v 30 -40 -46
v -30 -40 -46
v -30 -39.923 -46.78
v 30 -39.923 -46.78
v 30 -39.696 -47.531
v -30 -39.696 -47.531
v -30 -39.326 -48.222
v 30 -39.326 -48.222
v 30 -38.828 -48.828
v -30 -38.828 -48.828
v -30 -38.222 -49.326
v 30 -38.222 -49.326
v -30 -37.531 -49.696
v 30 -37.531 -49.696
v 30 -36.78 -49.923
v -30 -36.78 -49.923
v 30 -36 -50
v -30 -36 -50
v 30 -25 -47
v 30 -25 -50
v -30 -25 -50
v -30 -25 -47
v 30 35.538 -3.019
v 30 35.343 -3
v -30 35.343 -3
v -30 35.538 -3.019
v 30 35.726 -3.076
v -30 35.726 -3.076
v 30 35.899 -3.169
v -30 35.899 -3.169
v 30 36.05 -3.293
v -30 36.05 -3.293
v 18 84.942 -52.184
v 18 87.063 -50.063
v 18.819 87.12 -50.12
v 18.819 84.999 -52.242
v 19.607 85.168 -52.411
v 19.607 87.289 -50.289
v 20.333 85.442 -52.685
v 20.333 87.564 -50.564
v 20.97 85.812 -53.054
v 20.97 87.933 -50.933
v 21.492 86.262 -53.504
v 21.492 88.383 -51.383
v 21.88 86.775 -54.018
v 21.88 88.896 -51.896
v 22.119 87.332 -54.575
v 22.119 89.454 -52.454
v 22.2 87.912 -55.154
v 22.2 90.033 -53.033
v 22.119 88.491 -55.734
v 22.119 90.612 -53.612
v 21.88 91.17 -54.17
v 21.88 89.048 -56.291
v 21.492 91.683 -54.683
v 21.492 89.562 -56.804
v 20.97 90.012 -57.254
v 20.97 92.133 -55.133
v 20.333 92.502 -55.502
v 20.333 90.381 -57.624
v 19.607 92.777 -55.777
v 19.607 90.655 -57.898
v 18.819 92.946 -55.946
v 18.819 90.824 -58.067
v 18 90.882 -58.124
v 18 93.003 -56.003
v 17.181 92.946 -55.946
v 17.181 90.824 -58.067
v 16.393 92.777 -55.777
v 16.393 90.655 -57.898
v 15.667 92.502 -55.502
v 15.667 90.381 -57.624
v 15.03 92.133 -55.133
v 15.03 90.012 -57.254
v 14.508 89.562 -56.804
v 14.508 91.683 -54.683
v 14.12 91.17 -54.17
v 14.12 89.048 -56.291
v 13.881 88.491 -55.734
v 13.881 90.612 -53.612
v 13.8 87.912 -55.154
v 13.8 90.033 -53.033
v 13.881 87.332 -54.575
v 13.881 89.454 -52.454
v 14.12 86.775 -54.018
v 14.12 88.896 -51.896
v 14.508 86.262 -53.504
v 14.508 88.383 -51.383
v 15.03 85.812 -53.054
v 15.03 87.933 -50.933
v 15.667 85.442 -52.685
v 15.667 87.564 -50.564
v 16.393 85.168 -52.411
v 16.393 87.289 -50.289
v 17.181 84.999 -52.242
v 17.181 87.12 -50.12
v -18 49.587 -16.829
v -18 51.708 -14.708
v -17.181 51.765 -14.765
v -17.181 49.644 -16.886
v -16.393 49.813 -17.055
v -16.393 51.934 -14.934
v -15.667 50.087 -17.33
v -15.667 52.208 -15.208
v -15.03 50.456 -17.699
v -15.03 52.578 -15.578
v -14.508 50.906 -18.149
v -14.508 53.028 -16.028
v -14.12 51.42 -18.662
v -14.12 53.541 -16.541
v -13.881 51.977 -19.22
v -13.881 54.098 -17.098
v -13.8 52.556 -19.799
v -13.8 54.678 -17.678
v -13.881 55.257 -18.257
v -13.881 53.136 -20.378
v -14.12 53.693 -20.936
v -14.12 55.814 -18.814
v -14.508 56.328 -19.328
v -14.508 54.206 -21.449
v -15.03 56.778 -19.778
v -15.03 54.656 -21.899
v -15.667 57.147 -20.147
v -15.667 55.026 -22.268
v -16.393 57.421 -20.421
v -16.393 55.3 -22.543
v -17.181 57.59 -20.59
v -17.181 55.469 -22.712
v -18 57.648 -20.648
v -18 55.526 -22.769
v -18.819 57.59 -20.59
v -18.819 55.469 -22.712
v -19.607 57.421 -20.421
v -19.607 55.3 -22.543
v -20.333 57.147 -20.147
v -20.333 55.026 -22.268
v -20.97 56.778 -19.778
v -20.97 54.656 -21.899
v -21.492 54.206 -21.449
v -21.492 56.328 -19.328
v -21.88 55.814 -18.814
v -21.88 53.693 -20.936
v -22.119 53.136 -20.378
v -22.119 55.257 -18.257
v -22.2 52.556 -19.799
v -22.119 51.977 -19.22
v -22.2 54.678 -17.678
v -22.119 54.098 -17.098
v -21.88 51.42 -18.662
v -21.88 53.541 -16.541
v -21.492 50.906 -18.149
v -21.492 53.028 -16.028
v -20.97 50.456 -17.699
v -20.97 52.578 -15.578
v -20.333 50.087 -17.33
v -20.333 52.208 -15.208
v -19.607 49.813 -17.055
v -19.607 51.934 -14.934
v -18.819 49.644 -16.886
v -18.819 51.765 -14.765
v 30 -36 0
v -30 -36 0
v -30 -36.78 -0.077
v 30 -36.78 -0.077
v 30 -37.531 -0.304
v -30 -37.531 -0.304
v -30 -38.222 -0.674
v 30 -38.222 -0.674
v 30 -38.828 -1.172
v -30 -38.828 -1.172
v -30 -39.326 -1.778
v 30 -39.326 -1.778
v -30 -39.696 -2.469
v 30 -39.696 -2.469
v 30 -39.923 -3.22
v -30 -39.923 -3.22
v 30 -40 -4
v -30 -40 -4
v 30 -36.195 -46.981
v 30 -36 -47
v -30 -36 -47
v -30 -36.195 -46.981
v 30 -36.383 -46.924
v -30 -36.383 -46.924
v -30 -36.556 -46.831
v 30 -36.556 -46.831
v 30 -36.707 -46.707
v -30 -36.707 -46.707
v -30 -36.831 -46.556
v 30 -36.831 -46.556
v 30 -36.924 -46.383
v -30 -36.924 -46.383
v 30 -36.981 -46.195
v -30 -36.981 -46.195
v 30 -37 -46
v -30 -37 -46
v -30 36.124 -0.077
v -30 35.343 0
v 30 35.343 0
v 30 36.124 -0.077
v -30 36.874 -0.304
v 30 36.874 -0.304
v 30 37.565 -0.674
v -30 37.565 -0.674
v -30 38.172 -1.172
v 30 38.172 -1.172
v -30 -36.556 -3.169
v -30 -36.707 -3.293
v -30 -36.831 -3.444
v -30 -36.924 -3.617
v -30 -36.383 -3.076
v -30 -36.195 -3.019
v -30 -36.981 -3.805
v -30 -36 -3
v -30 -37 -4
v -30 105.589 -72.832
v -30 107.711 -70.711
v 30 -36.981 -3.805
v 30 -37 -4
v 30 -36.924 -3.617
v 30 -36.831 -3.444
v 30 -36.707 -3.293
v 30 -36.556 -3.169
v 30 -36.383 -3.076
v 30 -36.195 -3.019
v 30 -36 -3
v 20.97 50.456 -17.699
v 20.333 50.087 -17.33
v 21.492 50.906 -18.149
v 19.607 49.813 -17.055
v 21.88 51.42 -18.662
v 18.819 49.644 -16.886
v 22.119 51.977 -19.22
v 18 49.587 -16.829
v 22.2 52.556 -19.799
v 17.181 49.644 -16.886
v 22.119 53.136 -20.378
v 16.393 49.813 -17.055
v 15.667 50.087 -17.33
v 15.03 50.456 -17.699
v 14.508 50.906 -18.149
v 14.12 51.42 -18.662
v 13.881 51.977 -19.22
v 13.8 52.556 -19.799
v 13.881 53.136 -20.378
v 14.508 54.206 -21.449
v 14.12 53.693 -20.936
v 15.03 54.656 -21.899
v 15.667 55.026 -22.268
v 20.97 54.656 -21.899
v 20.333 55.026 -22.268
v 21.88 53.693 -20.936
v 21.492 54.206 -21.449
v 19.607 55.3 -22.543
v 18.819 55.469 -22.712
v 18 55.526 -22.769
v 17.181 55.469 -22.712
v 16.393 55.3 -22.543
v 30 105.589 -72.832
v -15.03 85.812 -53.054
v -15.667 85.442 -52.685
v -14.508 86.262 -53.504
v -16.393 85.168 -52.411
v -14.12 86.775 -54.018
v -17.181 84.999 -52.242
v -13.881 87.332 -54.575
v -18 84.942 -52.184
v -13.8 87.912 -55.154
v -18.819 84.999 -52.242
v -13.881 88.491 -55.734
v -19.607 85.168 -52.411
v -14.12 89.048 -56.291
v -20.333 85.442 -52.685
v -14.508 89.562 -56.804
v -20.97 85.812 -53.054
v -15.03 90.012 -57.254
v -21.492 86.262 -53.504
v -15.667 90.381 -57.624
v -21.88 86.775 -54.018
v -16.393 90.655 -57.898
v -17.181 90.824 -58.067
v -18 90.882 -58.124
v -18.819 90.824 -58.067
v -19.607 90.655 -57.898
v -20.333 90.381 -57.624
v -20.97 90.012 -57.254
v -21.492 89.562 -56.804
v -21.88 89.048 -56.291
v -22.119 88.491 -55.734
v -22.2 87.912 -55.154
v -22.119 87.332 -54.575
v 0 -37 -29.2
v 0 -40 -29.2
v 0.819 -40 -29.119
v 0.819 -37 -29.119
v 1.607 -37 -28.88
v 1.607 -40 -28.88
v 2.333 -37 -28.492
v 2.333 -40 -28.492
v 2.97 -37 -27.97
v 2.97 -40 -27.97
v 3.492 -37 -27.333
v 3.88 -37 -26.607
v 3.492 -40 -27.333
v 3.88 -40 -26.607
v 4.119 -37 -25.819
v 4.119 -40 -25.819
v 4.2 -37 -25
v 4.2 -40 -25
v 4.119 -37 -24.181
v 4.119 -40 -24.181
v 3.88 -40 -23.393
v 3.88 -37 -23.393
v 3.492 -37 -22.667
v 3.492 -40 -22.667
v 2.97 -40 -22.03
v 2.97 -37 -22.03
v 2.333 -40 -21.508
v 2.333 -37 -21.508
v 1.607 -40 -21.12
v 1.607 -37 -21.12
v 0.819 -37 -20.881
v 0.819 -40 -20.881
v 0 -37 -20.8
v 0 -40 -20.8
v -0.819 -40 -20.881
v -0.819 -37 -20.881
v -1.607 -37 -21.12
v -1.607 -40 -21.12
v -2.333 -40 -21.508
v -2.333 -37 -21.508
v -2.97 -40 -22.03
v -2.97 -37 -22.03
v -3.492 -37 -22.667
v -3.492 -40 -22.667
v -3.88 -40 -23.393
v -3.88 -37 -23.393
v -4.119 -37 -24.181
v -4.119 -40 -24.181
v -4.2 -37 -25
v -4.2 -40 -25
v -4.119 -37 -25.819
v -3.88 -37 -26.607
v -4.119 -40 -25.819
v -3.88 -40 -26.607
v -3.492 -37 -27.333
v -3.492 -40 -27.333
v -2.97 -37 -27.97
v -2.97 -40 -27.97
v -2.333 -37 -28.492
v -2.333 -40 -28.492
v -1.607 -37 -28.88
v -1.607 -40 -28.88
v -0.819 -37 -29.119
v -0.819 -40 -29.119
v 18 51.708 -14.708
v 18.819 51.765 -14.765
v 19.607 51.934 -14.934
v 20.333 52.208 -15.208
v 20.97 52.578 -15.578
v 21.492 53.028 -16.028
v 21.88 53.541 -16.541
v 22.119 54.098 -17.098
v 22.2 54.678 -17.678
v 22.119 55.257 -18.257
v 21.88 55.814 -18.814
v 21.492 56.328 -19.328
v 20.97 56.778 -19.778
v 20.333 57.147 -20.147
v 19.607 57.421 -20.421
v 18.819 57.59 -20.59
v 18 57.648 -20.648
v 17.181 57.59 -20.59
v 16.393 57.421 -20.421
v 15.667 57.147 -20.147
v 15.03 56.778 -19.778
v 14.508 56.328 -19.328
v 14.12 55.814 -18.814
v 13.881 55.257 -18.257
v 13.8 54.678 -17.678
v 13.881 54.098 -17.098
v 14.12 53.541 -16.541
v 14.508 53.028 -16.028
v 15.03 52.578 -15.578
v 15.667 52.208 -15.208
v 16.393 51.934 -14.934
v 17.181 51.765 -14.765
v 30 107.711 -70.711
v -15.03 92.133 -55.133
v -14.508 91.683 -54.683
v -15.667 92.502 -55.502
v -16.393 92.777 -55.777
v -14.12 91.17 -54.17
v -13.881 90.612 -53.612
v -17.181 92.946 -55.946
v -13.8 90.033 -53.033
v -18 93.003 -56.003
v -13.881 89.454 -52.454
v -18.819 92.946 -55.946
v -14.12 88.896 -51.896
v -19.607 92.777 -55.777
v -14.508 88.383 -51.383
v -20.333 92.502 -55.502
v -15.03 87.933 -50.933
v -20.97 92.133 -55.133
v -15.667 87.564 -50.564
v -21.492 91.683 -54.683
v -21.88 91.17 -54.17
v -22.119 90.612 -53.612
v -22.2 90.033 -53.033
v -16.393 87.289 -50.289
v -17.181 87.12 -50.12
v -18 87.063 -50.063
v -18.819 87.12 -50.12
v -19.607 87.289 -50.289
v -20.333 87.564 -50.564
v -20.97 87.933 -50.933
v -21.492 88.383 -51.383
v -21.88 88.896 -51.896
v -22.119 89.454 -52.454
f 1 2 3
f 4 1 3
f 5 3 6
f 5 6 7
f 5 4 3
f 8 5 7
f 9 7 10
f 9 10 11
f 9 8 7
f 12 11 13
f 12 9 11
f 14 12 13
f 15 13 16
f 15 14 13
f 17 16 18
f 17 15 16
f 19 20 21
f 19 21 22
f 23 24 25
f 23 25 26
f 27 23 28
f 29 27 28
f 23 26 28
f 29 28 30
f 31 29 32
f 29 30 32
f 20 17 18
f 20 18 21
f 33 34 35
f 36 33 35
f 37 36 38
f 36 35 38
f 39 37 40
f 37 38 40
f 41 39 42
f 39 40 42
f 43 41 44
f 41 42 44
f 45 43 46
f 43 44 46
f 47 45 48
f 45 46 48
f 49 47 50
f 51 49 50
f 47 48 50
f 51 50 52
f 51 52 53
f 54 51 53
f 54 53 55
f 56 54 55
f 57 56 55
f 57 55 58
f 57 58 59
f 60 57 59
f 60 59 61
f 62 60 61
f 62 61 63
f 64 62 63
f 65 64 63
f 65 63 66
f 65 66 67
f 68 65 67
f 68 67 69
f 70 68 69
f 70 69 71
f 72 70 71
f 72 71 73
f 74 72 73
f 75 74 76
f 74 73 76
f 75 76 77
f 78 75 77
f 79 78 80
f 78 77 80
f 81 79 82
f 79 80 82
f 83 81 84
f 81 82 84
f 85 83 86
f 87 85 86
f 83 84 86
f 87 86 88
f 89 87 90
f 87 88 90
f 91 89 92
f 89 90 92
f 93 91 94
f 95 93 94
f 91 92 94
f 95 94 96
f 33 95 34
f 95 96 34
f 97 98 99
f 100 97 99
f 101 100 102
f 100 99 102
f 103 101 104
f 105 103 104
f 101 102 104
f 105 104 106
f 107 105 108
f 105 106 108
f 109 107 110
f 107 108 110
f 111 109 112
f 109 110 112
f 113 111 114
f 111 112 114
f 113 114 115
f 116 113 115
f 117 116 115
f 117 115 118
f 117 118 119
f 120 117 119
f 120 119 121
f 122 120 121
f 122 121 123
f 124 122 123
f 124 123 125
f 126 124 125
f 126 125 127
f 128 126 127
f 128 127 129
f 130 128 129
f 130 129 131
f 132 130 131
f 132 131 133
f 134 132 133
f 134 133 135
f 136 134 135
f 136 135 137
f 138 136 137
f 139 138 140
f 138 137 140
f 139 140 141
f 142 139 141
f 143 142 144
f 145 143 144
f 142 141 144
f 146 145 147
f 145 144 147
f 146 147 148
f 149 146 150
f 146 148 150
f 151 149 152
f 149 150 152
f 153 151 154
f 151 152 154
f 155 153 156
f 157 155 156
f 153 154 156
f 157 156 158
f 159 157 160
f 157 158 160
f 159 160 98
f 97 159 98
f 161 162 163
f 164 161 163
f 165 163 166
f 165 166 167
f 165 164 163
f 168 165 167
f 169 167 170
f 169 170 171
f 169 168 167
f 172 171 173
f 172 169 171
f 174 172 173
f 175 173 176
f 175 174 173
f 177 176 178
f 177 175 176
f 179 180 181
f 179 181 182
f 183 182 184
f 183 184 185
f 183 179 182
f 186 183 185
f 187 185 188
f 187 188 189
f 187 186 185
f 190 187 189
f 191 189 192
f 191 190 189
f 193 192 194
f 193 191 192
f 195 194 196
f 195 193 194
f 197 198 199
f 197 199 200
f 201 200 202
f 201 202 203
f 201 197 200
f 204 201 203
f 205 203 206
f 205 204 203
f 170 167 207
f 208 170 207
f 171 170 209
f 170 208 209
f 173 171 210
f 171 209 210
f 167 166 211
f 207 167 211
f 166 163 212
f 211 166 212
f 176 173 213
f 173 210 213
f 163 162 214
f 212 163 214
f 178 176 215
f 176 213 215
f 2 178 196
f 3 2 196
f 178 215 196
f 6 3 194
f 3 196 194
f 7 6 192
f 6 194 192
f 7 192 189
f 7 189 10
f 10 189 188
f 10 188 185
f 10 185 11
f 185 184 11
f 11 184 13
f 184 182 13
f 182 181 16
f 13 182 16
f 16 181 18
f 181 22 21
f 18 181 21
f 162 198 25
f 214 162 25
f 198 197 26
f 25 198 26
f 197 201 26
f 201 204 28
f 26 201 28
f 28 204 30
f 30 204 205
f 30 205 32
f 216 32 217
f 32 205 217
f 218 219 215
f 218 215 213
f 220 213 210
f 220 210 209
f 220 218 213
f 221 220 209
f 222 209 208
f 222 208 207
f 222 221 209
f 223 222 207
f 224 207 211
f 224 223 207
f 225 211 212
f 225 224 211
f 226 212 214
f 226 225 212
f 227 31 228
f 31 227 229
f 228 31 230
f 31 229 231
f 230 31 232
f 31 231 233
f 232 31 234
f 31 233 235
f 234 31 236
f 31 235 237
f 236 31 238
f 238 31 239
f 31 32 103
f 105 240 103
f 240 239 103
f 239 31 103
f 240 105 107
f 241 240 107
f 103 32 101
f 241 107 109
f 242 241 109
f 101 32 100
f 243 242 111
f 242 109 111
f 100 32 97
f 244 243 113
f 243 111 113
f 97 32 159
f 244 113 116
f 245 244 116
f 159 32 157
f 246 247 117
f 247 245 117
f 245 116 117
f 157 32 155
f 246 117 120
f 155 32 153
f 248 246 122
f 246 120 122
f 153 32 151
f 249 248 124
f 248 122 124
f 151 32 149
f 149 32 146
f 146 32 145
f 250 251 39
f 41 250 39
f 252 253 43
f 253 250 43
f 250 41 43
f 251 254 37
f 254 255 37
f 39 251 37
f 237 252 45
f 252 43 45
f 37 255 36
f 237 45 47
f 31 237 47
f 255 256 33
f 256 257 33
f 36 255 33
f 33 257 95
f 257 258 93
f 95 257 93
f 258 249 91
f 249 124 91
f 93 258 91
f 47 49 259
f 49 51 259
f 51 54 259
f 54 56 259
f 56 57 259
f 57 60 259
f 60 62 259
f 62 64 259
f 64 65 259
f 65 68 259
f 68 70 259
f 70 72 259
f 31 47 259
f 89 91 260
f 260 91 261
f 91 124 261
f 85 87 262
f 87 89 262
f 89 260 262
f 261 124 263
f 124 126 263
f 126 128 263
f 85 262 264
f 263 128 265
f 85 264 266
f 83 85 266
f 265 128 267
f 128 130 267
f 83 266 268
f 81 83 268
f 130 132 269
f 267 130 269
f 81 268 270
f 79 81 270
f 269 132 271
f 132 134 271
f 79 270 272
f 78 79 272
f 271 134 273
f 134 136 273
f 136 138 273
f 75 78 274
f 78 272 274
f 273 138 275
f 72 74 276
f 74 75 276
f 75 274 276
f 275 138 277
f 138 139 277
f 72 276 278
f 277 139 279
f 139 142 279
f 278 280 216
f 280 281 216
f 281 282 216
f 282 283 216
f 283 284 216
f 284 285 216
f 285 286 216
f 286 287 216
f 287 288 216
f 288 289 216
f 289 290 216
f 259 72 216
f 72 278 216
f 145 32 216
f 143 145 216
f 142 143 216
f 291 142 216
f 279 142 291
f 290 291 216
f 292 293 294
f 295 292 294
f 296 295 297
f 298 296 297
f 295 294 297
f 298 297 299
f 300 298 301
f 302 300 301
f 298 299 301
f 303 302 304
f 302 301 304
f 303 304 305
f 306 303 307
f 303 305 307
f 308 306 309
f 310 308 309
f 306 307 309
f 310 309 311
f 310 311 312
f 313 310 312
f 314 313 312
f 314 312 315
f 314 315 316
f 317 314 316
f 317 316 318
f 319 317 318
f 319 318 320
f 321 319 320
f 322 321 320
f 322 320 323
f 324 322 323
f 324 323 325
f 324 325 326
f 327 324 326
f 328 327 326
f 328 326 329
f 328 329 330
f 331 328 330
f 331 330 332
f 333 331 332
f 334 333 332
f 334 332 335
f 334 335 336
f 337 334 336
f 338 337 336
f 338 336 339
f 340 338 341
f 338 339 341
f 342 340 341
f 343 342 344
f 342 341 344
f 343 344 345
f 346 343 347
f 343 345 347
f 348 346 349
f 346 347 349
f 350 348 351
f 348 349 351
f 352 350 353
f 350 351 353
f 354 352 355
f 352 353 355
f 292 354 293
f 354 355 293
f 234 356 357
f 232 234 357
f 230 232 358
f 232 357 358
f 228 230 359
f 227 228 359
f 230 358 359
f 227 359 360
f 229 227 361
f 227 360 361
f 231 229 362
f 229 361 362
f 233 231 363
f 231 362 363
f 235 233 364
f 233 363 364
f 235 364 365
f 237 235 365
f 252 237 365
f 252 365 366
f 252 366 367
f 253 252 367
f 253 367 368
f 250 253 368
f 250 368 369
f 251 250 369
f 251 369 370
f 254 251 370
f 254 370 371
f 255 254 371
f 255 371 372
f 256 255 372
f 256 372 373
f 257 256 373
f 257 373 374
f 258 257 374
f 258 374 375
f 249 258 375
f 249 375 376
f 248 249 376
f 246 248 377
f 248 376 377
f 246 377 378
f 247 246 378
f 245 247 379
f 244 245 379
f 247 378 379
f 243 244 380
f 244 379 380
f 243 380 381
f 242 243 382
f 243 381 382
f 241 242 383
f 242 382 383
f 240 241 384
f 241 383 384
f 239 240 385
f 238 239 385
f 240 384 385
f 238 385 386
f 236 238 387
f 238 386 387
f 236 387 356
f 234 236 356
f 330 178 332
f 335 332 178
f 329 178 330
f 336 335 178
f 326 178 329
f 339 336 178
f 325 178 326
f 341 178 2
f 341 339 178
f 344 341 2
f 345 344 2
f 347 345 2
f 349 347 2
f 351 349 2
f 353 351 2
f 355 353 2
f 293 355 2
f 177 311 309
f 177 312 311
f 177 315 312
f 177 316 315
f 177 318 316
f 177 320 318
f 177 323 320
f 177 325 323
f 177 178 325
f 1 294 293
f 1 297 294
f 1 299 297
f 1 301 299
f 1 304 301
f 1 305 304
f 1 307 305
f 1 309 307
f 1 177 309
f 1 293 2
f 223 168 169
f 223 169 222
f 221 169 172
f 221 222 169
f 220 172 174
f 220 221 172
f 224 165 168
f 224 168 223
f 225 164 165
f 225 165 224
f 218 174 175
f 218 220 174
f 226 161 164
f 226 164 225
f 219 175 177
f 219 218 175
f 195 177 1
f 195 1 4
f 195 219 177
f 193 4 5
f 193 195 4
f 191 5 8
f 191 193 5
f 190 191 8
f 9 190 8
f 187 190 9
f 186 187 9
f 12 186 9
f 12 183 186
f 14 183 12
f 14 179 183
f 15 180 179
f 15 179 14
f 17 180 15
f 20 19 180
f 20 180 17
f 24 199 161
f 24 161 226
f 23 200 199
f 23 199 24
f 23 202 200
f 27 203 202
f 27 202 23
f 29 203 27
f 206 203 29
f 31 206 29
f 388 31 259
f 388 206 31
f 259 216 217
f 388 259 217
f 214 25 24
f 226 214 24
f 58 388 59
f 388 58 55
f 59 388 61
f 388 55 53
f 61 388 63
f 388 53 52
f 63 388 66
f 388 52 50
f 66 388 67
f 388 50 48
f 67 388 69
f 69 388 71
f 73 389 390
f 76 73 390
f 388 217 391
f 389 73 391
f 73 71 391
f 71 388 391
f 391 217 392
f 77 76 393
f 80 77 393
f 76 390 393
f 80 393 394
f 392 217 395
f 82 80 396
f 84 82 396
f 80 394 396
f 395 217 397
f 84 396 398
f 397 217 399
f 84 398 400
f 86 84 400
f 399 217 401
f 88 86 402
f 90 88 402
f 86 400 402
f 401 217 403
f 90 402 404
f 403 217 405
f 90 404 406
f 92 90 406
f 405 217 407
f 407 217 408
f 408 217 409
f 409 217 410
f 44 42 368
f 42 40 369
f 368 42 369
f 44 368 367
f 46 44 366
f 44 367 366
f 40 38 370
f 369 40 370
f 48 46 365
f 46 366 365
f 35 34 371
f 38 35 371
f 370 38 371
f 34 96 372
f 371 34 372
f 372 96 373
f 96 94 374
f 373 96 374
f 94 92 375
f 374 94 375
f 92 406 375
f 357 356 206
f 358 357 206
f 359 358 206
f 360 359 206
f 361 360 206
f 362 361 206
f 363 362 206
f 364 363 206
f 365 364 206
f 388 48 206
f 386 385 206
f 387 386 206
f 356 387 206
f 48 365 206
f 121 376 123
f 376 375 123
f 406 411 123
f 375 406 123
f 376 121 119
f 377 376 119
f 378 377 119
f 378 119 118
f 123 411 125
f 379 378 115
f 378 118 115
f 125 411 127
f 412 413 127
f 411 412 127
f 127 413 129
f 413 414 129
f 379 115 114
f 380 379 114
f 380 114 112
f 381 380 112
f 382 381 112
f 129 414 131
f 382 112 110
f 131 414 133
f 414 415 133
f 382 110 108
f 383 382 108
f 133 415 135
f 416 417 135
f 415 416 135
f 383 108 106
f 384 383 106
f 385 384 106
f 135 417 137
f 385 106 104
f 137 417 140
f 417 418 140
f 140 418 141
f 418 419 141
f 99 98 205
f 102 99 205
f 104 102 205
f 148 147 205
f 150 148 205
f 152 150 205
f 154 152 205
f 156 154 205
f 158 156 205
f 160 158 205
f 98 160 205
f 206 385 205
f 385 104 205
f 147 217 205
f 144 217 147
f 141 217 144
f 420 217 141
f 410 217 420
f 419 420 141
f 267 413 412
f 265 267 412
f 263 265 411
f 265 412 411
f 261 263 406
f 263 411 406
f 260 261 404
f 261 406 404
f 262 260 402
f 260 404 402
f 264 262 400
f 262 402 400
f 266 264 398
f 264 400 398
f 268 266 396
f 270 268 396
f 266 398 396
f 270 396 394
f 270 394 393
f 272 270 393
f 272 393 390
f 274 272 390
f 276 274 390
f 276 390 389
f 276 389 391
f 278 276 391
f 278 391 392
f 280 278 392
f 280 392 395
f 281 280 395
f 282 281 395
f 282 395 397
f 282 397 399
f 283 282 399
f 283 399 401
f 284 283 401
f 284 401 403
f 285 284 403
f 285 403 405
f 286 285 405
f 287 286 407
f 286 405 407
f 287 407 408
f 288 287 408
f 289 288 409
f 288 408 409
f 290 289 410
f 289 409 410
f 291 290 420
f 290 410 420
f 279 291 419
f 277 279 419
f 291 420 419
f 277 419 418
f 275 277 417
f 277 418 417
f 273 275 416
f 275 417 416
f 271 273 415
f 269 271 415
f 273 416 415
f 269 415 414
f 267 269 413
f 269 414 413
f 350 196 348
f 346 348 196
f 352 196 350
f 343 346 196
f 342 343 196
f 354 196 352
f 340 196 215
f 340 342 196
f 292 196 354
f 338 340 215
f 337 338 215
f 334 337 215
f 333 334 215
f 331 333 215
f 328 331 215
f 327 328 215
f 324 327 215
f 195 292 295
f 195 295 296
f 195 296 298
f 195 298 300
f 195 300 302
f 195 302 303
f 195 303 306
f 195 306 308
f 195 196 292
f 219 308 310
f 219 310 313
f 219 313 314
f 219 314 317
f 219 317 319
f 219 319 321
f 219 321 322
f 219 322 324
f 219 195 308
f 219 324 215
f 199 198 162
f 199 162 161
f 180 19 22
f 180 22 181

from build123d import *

# Parameters (mm, degrees)
SKETCH1_W                    = 60
SKETCH1_H                    = 80
BASE_FLANGE1_DEPTH           = 3
EDGE_FLANGE1_START           = -30
EDGE_FLANGE1_DEPTH           = 60
EDGE_FLANGE1_2_DEPTH         = 60
EDGE_FLANGE2_STRIP_W         = 14
EDGE_FLANGE2_STRIP_H         = 3
EDGE_FLANGE2_STRIP_CUT_DEPTH = 60
EDGE_FLANGE2_DEPTH           = 60
EDGE_FLANGE3_STRIP_W         = 14
EDGE_FLANGE3_STRIP_H         = 3
EDGE_FLANGE3_STRIP_CUT_DEPTH = 60
EDGE_FLANGE3_DEPTH           = 60
SKETCH17_R                   = 4.2
CUT_EXTRUDE1_DEPTH           = 10
SKETCH18_R                   = 4.2
CUT_EXTRUDE2_DEPTH           = 10


# Read off the part's stored shape, not the designer's step: Edge-Flange1
# Sheet-metal steps are written as plain solids
with BuildPart() as part:
    # Sketch1 → Base-Flange1 (new body)
    with BuildSketch(Plane.XY):
        Rectangle(SKETCH1_W, SKETCH1_H)
    extrude(amount=-BASE_FLANGE1_DEPTH)

    # Edge-Flange1 outline → Edge-Flange1 (cut)
    with BuildSketch(Plane.YZ.offset(EDGE_FLANGE1_START)):
        with BuildLine():
            ThreePointArc((35.343145751, 0), (36.87387948, -0.30448187), (38.171572875, -1.171572875))
            Line((38.171572875, -1.171572875), (40, -3))
            Line((40, -3), (40, 0))
            Line((40, 0), (35.343145751, 0))
        make_face()
    extrude(amount=EDGE_FLANGE1_DEPTH, mode=Mode.SUBTRACT)

    # Edge-Flange1 2 outline → Edge-Flange1 2 (add)
    with BuildSketch(Plane.YZ.offset(EDGE_FLANGE1_START)):
        with BuildLine():
            Line((107.710678119, -70.710678119), (40, -3))
            Line((40, -3), (35.343145751, -3))
            ThreePointArc((35.343145751, -3), (35.725829183, -3.076120467), (36.050252532, -3.292893219))
            Line((36.050252532, -3.292893219), (105.589357775, -72.831998462))
            Line((105.589357775, -72.831998462), (107.710678119, -70.710678119))
        make_face()
    extrude(amount=EDGE_FLANGE1_2_DEPTH)

    # Edge-Flange2 strip (across the edge) → Edge-Flange2 strip cut (cut)
    with BuildSketch(Plane(origin=(30, -40, -3), x_dir=(0, 1, 0), z_dir=(-1, 0, 0))):
        with Locations((-3, -1.5)):
            Rectangle(EDGE_FLANGE2_STRIP_W, EDGE_FLANGE2_STRIP_H)
    extrude(amount=EDGE_FLANGE2_STRIP_CUT_DEPTH, mode=Mode.SUBTRACT)

    # Edge-Flange2 section (across the edge) → Edge-Flange2 (add)
    with BuildSketch(Plane(origin=(30, -40, -3), x_dir=(0, 1, 0), z_dir=(-1, 0, 0))):
        with BuildLine():
            Line((0, 1), (0, 47))
            Line((0, 47), (3, 47))
            Line((3, 47), (3, 1))
            ThreePointArc((3, 1), (3.292893219, 0.292893219), (4, 0))
            Line((4, 0), (4, -3))
            ThreePointArc((4, -3), (1.171572875, -1.828427125), (0, 1))
        make_face()
    extrude(amount=EDGE_FLANGE2_DEPTH)

    # Edge-Flange3 strip (across the edge) → Edge-Flange3 strip cut (cut)
    with BuildSketch(Plane(origin=(30, -37, -50), x_dir=(0, 0, 1), z_dir=(-1, 0, 0))):
        with Locations((-3, -1.5)):
            Rectangle(EDGE_FLANGE3_STRIP_W, EDGE_FLANGE3_STRIP_H)
    extrude(amount=EDGE_FLANGE3_STRIP_CUT_DEPTH, mode=Mode.SUBTRACT)

    # Edge-Flange3 section (across the edge) → Edge-Flange3 (add)
    with BuildSketch(Plane(origin=(30, -37, -50), x_dir=(0, 0, 1), z_dir=(-1, 0, 0))):
        with BuildLine():
            Line((0, 1), (0, 12))
            Line((0, 12), (3, 12))
            Line((3, 12), (3, 1))
            ThreePointArc((3, 1), (3.292893219, 0.292893219), (4, 0))
            Line((4, 0), (4, -3))
            ThreePointArc((4, -3), (1.171572875, -1.828427125), (0, 1))
        make_face()
    extrude(amount=EDGE_FLANGE3_DEPTH)

    # Sketch17 → Cut-Extrude1 (cut)
    with BuildSketch(Plane.XZ.offset(40)):
        with Locations(Location((0, -25, 0), (0, 0, 270))):
            Circle(SKETCH17_R)
    extrude(amount=-CUT_EXTRUDE1_DEPTH, mode=Mode.SUBTRACT)

    # Sketch18 → Cut-Extrude2 (cut)
    with BuildSketch(Plane(origin=(0, 18.5, 18.5), x_dir=(1, 0, 0), z_dir=(0, 0.7071067811865438, 0.7071067811865513))):
        with Locations(Location((-18, 101.162950904, 0), (0, 0, 270))):
            Circle(SKETCH18_R)
        with Locations(Location((18, 101.162950904, 0), (0, 0, 270))):
            Circle(SKETCH18_R)
        with Locations(Location((18, 51.162950904, 0), (0, 0, 270))):
            Circle(SKETCH18_R)
        with Locations(Location((-18, 51.162950904, 0), (0, 0, 270))):
            Circle(SKETCH18_R)
    extrude(amount=-CUT_EXTRUDE2_DEPTH, mode=Mode.SUBTRACT)


solid = part.part
